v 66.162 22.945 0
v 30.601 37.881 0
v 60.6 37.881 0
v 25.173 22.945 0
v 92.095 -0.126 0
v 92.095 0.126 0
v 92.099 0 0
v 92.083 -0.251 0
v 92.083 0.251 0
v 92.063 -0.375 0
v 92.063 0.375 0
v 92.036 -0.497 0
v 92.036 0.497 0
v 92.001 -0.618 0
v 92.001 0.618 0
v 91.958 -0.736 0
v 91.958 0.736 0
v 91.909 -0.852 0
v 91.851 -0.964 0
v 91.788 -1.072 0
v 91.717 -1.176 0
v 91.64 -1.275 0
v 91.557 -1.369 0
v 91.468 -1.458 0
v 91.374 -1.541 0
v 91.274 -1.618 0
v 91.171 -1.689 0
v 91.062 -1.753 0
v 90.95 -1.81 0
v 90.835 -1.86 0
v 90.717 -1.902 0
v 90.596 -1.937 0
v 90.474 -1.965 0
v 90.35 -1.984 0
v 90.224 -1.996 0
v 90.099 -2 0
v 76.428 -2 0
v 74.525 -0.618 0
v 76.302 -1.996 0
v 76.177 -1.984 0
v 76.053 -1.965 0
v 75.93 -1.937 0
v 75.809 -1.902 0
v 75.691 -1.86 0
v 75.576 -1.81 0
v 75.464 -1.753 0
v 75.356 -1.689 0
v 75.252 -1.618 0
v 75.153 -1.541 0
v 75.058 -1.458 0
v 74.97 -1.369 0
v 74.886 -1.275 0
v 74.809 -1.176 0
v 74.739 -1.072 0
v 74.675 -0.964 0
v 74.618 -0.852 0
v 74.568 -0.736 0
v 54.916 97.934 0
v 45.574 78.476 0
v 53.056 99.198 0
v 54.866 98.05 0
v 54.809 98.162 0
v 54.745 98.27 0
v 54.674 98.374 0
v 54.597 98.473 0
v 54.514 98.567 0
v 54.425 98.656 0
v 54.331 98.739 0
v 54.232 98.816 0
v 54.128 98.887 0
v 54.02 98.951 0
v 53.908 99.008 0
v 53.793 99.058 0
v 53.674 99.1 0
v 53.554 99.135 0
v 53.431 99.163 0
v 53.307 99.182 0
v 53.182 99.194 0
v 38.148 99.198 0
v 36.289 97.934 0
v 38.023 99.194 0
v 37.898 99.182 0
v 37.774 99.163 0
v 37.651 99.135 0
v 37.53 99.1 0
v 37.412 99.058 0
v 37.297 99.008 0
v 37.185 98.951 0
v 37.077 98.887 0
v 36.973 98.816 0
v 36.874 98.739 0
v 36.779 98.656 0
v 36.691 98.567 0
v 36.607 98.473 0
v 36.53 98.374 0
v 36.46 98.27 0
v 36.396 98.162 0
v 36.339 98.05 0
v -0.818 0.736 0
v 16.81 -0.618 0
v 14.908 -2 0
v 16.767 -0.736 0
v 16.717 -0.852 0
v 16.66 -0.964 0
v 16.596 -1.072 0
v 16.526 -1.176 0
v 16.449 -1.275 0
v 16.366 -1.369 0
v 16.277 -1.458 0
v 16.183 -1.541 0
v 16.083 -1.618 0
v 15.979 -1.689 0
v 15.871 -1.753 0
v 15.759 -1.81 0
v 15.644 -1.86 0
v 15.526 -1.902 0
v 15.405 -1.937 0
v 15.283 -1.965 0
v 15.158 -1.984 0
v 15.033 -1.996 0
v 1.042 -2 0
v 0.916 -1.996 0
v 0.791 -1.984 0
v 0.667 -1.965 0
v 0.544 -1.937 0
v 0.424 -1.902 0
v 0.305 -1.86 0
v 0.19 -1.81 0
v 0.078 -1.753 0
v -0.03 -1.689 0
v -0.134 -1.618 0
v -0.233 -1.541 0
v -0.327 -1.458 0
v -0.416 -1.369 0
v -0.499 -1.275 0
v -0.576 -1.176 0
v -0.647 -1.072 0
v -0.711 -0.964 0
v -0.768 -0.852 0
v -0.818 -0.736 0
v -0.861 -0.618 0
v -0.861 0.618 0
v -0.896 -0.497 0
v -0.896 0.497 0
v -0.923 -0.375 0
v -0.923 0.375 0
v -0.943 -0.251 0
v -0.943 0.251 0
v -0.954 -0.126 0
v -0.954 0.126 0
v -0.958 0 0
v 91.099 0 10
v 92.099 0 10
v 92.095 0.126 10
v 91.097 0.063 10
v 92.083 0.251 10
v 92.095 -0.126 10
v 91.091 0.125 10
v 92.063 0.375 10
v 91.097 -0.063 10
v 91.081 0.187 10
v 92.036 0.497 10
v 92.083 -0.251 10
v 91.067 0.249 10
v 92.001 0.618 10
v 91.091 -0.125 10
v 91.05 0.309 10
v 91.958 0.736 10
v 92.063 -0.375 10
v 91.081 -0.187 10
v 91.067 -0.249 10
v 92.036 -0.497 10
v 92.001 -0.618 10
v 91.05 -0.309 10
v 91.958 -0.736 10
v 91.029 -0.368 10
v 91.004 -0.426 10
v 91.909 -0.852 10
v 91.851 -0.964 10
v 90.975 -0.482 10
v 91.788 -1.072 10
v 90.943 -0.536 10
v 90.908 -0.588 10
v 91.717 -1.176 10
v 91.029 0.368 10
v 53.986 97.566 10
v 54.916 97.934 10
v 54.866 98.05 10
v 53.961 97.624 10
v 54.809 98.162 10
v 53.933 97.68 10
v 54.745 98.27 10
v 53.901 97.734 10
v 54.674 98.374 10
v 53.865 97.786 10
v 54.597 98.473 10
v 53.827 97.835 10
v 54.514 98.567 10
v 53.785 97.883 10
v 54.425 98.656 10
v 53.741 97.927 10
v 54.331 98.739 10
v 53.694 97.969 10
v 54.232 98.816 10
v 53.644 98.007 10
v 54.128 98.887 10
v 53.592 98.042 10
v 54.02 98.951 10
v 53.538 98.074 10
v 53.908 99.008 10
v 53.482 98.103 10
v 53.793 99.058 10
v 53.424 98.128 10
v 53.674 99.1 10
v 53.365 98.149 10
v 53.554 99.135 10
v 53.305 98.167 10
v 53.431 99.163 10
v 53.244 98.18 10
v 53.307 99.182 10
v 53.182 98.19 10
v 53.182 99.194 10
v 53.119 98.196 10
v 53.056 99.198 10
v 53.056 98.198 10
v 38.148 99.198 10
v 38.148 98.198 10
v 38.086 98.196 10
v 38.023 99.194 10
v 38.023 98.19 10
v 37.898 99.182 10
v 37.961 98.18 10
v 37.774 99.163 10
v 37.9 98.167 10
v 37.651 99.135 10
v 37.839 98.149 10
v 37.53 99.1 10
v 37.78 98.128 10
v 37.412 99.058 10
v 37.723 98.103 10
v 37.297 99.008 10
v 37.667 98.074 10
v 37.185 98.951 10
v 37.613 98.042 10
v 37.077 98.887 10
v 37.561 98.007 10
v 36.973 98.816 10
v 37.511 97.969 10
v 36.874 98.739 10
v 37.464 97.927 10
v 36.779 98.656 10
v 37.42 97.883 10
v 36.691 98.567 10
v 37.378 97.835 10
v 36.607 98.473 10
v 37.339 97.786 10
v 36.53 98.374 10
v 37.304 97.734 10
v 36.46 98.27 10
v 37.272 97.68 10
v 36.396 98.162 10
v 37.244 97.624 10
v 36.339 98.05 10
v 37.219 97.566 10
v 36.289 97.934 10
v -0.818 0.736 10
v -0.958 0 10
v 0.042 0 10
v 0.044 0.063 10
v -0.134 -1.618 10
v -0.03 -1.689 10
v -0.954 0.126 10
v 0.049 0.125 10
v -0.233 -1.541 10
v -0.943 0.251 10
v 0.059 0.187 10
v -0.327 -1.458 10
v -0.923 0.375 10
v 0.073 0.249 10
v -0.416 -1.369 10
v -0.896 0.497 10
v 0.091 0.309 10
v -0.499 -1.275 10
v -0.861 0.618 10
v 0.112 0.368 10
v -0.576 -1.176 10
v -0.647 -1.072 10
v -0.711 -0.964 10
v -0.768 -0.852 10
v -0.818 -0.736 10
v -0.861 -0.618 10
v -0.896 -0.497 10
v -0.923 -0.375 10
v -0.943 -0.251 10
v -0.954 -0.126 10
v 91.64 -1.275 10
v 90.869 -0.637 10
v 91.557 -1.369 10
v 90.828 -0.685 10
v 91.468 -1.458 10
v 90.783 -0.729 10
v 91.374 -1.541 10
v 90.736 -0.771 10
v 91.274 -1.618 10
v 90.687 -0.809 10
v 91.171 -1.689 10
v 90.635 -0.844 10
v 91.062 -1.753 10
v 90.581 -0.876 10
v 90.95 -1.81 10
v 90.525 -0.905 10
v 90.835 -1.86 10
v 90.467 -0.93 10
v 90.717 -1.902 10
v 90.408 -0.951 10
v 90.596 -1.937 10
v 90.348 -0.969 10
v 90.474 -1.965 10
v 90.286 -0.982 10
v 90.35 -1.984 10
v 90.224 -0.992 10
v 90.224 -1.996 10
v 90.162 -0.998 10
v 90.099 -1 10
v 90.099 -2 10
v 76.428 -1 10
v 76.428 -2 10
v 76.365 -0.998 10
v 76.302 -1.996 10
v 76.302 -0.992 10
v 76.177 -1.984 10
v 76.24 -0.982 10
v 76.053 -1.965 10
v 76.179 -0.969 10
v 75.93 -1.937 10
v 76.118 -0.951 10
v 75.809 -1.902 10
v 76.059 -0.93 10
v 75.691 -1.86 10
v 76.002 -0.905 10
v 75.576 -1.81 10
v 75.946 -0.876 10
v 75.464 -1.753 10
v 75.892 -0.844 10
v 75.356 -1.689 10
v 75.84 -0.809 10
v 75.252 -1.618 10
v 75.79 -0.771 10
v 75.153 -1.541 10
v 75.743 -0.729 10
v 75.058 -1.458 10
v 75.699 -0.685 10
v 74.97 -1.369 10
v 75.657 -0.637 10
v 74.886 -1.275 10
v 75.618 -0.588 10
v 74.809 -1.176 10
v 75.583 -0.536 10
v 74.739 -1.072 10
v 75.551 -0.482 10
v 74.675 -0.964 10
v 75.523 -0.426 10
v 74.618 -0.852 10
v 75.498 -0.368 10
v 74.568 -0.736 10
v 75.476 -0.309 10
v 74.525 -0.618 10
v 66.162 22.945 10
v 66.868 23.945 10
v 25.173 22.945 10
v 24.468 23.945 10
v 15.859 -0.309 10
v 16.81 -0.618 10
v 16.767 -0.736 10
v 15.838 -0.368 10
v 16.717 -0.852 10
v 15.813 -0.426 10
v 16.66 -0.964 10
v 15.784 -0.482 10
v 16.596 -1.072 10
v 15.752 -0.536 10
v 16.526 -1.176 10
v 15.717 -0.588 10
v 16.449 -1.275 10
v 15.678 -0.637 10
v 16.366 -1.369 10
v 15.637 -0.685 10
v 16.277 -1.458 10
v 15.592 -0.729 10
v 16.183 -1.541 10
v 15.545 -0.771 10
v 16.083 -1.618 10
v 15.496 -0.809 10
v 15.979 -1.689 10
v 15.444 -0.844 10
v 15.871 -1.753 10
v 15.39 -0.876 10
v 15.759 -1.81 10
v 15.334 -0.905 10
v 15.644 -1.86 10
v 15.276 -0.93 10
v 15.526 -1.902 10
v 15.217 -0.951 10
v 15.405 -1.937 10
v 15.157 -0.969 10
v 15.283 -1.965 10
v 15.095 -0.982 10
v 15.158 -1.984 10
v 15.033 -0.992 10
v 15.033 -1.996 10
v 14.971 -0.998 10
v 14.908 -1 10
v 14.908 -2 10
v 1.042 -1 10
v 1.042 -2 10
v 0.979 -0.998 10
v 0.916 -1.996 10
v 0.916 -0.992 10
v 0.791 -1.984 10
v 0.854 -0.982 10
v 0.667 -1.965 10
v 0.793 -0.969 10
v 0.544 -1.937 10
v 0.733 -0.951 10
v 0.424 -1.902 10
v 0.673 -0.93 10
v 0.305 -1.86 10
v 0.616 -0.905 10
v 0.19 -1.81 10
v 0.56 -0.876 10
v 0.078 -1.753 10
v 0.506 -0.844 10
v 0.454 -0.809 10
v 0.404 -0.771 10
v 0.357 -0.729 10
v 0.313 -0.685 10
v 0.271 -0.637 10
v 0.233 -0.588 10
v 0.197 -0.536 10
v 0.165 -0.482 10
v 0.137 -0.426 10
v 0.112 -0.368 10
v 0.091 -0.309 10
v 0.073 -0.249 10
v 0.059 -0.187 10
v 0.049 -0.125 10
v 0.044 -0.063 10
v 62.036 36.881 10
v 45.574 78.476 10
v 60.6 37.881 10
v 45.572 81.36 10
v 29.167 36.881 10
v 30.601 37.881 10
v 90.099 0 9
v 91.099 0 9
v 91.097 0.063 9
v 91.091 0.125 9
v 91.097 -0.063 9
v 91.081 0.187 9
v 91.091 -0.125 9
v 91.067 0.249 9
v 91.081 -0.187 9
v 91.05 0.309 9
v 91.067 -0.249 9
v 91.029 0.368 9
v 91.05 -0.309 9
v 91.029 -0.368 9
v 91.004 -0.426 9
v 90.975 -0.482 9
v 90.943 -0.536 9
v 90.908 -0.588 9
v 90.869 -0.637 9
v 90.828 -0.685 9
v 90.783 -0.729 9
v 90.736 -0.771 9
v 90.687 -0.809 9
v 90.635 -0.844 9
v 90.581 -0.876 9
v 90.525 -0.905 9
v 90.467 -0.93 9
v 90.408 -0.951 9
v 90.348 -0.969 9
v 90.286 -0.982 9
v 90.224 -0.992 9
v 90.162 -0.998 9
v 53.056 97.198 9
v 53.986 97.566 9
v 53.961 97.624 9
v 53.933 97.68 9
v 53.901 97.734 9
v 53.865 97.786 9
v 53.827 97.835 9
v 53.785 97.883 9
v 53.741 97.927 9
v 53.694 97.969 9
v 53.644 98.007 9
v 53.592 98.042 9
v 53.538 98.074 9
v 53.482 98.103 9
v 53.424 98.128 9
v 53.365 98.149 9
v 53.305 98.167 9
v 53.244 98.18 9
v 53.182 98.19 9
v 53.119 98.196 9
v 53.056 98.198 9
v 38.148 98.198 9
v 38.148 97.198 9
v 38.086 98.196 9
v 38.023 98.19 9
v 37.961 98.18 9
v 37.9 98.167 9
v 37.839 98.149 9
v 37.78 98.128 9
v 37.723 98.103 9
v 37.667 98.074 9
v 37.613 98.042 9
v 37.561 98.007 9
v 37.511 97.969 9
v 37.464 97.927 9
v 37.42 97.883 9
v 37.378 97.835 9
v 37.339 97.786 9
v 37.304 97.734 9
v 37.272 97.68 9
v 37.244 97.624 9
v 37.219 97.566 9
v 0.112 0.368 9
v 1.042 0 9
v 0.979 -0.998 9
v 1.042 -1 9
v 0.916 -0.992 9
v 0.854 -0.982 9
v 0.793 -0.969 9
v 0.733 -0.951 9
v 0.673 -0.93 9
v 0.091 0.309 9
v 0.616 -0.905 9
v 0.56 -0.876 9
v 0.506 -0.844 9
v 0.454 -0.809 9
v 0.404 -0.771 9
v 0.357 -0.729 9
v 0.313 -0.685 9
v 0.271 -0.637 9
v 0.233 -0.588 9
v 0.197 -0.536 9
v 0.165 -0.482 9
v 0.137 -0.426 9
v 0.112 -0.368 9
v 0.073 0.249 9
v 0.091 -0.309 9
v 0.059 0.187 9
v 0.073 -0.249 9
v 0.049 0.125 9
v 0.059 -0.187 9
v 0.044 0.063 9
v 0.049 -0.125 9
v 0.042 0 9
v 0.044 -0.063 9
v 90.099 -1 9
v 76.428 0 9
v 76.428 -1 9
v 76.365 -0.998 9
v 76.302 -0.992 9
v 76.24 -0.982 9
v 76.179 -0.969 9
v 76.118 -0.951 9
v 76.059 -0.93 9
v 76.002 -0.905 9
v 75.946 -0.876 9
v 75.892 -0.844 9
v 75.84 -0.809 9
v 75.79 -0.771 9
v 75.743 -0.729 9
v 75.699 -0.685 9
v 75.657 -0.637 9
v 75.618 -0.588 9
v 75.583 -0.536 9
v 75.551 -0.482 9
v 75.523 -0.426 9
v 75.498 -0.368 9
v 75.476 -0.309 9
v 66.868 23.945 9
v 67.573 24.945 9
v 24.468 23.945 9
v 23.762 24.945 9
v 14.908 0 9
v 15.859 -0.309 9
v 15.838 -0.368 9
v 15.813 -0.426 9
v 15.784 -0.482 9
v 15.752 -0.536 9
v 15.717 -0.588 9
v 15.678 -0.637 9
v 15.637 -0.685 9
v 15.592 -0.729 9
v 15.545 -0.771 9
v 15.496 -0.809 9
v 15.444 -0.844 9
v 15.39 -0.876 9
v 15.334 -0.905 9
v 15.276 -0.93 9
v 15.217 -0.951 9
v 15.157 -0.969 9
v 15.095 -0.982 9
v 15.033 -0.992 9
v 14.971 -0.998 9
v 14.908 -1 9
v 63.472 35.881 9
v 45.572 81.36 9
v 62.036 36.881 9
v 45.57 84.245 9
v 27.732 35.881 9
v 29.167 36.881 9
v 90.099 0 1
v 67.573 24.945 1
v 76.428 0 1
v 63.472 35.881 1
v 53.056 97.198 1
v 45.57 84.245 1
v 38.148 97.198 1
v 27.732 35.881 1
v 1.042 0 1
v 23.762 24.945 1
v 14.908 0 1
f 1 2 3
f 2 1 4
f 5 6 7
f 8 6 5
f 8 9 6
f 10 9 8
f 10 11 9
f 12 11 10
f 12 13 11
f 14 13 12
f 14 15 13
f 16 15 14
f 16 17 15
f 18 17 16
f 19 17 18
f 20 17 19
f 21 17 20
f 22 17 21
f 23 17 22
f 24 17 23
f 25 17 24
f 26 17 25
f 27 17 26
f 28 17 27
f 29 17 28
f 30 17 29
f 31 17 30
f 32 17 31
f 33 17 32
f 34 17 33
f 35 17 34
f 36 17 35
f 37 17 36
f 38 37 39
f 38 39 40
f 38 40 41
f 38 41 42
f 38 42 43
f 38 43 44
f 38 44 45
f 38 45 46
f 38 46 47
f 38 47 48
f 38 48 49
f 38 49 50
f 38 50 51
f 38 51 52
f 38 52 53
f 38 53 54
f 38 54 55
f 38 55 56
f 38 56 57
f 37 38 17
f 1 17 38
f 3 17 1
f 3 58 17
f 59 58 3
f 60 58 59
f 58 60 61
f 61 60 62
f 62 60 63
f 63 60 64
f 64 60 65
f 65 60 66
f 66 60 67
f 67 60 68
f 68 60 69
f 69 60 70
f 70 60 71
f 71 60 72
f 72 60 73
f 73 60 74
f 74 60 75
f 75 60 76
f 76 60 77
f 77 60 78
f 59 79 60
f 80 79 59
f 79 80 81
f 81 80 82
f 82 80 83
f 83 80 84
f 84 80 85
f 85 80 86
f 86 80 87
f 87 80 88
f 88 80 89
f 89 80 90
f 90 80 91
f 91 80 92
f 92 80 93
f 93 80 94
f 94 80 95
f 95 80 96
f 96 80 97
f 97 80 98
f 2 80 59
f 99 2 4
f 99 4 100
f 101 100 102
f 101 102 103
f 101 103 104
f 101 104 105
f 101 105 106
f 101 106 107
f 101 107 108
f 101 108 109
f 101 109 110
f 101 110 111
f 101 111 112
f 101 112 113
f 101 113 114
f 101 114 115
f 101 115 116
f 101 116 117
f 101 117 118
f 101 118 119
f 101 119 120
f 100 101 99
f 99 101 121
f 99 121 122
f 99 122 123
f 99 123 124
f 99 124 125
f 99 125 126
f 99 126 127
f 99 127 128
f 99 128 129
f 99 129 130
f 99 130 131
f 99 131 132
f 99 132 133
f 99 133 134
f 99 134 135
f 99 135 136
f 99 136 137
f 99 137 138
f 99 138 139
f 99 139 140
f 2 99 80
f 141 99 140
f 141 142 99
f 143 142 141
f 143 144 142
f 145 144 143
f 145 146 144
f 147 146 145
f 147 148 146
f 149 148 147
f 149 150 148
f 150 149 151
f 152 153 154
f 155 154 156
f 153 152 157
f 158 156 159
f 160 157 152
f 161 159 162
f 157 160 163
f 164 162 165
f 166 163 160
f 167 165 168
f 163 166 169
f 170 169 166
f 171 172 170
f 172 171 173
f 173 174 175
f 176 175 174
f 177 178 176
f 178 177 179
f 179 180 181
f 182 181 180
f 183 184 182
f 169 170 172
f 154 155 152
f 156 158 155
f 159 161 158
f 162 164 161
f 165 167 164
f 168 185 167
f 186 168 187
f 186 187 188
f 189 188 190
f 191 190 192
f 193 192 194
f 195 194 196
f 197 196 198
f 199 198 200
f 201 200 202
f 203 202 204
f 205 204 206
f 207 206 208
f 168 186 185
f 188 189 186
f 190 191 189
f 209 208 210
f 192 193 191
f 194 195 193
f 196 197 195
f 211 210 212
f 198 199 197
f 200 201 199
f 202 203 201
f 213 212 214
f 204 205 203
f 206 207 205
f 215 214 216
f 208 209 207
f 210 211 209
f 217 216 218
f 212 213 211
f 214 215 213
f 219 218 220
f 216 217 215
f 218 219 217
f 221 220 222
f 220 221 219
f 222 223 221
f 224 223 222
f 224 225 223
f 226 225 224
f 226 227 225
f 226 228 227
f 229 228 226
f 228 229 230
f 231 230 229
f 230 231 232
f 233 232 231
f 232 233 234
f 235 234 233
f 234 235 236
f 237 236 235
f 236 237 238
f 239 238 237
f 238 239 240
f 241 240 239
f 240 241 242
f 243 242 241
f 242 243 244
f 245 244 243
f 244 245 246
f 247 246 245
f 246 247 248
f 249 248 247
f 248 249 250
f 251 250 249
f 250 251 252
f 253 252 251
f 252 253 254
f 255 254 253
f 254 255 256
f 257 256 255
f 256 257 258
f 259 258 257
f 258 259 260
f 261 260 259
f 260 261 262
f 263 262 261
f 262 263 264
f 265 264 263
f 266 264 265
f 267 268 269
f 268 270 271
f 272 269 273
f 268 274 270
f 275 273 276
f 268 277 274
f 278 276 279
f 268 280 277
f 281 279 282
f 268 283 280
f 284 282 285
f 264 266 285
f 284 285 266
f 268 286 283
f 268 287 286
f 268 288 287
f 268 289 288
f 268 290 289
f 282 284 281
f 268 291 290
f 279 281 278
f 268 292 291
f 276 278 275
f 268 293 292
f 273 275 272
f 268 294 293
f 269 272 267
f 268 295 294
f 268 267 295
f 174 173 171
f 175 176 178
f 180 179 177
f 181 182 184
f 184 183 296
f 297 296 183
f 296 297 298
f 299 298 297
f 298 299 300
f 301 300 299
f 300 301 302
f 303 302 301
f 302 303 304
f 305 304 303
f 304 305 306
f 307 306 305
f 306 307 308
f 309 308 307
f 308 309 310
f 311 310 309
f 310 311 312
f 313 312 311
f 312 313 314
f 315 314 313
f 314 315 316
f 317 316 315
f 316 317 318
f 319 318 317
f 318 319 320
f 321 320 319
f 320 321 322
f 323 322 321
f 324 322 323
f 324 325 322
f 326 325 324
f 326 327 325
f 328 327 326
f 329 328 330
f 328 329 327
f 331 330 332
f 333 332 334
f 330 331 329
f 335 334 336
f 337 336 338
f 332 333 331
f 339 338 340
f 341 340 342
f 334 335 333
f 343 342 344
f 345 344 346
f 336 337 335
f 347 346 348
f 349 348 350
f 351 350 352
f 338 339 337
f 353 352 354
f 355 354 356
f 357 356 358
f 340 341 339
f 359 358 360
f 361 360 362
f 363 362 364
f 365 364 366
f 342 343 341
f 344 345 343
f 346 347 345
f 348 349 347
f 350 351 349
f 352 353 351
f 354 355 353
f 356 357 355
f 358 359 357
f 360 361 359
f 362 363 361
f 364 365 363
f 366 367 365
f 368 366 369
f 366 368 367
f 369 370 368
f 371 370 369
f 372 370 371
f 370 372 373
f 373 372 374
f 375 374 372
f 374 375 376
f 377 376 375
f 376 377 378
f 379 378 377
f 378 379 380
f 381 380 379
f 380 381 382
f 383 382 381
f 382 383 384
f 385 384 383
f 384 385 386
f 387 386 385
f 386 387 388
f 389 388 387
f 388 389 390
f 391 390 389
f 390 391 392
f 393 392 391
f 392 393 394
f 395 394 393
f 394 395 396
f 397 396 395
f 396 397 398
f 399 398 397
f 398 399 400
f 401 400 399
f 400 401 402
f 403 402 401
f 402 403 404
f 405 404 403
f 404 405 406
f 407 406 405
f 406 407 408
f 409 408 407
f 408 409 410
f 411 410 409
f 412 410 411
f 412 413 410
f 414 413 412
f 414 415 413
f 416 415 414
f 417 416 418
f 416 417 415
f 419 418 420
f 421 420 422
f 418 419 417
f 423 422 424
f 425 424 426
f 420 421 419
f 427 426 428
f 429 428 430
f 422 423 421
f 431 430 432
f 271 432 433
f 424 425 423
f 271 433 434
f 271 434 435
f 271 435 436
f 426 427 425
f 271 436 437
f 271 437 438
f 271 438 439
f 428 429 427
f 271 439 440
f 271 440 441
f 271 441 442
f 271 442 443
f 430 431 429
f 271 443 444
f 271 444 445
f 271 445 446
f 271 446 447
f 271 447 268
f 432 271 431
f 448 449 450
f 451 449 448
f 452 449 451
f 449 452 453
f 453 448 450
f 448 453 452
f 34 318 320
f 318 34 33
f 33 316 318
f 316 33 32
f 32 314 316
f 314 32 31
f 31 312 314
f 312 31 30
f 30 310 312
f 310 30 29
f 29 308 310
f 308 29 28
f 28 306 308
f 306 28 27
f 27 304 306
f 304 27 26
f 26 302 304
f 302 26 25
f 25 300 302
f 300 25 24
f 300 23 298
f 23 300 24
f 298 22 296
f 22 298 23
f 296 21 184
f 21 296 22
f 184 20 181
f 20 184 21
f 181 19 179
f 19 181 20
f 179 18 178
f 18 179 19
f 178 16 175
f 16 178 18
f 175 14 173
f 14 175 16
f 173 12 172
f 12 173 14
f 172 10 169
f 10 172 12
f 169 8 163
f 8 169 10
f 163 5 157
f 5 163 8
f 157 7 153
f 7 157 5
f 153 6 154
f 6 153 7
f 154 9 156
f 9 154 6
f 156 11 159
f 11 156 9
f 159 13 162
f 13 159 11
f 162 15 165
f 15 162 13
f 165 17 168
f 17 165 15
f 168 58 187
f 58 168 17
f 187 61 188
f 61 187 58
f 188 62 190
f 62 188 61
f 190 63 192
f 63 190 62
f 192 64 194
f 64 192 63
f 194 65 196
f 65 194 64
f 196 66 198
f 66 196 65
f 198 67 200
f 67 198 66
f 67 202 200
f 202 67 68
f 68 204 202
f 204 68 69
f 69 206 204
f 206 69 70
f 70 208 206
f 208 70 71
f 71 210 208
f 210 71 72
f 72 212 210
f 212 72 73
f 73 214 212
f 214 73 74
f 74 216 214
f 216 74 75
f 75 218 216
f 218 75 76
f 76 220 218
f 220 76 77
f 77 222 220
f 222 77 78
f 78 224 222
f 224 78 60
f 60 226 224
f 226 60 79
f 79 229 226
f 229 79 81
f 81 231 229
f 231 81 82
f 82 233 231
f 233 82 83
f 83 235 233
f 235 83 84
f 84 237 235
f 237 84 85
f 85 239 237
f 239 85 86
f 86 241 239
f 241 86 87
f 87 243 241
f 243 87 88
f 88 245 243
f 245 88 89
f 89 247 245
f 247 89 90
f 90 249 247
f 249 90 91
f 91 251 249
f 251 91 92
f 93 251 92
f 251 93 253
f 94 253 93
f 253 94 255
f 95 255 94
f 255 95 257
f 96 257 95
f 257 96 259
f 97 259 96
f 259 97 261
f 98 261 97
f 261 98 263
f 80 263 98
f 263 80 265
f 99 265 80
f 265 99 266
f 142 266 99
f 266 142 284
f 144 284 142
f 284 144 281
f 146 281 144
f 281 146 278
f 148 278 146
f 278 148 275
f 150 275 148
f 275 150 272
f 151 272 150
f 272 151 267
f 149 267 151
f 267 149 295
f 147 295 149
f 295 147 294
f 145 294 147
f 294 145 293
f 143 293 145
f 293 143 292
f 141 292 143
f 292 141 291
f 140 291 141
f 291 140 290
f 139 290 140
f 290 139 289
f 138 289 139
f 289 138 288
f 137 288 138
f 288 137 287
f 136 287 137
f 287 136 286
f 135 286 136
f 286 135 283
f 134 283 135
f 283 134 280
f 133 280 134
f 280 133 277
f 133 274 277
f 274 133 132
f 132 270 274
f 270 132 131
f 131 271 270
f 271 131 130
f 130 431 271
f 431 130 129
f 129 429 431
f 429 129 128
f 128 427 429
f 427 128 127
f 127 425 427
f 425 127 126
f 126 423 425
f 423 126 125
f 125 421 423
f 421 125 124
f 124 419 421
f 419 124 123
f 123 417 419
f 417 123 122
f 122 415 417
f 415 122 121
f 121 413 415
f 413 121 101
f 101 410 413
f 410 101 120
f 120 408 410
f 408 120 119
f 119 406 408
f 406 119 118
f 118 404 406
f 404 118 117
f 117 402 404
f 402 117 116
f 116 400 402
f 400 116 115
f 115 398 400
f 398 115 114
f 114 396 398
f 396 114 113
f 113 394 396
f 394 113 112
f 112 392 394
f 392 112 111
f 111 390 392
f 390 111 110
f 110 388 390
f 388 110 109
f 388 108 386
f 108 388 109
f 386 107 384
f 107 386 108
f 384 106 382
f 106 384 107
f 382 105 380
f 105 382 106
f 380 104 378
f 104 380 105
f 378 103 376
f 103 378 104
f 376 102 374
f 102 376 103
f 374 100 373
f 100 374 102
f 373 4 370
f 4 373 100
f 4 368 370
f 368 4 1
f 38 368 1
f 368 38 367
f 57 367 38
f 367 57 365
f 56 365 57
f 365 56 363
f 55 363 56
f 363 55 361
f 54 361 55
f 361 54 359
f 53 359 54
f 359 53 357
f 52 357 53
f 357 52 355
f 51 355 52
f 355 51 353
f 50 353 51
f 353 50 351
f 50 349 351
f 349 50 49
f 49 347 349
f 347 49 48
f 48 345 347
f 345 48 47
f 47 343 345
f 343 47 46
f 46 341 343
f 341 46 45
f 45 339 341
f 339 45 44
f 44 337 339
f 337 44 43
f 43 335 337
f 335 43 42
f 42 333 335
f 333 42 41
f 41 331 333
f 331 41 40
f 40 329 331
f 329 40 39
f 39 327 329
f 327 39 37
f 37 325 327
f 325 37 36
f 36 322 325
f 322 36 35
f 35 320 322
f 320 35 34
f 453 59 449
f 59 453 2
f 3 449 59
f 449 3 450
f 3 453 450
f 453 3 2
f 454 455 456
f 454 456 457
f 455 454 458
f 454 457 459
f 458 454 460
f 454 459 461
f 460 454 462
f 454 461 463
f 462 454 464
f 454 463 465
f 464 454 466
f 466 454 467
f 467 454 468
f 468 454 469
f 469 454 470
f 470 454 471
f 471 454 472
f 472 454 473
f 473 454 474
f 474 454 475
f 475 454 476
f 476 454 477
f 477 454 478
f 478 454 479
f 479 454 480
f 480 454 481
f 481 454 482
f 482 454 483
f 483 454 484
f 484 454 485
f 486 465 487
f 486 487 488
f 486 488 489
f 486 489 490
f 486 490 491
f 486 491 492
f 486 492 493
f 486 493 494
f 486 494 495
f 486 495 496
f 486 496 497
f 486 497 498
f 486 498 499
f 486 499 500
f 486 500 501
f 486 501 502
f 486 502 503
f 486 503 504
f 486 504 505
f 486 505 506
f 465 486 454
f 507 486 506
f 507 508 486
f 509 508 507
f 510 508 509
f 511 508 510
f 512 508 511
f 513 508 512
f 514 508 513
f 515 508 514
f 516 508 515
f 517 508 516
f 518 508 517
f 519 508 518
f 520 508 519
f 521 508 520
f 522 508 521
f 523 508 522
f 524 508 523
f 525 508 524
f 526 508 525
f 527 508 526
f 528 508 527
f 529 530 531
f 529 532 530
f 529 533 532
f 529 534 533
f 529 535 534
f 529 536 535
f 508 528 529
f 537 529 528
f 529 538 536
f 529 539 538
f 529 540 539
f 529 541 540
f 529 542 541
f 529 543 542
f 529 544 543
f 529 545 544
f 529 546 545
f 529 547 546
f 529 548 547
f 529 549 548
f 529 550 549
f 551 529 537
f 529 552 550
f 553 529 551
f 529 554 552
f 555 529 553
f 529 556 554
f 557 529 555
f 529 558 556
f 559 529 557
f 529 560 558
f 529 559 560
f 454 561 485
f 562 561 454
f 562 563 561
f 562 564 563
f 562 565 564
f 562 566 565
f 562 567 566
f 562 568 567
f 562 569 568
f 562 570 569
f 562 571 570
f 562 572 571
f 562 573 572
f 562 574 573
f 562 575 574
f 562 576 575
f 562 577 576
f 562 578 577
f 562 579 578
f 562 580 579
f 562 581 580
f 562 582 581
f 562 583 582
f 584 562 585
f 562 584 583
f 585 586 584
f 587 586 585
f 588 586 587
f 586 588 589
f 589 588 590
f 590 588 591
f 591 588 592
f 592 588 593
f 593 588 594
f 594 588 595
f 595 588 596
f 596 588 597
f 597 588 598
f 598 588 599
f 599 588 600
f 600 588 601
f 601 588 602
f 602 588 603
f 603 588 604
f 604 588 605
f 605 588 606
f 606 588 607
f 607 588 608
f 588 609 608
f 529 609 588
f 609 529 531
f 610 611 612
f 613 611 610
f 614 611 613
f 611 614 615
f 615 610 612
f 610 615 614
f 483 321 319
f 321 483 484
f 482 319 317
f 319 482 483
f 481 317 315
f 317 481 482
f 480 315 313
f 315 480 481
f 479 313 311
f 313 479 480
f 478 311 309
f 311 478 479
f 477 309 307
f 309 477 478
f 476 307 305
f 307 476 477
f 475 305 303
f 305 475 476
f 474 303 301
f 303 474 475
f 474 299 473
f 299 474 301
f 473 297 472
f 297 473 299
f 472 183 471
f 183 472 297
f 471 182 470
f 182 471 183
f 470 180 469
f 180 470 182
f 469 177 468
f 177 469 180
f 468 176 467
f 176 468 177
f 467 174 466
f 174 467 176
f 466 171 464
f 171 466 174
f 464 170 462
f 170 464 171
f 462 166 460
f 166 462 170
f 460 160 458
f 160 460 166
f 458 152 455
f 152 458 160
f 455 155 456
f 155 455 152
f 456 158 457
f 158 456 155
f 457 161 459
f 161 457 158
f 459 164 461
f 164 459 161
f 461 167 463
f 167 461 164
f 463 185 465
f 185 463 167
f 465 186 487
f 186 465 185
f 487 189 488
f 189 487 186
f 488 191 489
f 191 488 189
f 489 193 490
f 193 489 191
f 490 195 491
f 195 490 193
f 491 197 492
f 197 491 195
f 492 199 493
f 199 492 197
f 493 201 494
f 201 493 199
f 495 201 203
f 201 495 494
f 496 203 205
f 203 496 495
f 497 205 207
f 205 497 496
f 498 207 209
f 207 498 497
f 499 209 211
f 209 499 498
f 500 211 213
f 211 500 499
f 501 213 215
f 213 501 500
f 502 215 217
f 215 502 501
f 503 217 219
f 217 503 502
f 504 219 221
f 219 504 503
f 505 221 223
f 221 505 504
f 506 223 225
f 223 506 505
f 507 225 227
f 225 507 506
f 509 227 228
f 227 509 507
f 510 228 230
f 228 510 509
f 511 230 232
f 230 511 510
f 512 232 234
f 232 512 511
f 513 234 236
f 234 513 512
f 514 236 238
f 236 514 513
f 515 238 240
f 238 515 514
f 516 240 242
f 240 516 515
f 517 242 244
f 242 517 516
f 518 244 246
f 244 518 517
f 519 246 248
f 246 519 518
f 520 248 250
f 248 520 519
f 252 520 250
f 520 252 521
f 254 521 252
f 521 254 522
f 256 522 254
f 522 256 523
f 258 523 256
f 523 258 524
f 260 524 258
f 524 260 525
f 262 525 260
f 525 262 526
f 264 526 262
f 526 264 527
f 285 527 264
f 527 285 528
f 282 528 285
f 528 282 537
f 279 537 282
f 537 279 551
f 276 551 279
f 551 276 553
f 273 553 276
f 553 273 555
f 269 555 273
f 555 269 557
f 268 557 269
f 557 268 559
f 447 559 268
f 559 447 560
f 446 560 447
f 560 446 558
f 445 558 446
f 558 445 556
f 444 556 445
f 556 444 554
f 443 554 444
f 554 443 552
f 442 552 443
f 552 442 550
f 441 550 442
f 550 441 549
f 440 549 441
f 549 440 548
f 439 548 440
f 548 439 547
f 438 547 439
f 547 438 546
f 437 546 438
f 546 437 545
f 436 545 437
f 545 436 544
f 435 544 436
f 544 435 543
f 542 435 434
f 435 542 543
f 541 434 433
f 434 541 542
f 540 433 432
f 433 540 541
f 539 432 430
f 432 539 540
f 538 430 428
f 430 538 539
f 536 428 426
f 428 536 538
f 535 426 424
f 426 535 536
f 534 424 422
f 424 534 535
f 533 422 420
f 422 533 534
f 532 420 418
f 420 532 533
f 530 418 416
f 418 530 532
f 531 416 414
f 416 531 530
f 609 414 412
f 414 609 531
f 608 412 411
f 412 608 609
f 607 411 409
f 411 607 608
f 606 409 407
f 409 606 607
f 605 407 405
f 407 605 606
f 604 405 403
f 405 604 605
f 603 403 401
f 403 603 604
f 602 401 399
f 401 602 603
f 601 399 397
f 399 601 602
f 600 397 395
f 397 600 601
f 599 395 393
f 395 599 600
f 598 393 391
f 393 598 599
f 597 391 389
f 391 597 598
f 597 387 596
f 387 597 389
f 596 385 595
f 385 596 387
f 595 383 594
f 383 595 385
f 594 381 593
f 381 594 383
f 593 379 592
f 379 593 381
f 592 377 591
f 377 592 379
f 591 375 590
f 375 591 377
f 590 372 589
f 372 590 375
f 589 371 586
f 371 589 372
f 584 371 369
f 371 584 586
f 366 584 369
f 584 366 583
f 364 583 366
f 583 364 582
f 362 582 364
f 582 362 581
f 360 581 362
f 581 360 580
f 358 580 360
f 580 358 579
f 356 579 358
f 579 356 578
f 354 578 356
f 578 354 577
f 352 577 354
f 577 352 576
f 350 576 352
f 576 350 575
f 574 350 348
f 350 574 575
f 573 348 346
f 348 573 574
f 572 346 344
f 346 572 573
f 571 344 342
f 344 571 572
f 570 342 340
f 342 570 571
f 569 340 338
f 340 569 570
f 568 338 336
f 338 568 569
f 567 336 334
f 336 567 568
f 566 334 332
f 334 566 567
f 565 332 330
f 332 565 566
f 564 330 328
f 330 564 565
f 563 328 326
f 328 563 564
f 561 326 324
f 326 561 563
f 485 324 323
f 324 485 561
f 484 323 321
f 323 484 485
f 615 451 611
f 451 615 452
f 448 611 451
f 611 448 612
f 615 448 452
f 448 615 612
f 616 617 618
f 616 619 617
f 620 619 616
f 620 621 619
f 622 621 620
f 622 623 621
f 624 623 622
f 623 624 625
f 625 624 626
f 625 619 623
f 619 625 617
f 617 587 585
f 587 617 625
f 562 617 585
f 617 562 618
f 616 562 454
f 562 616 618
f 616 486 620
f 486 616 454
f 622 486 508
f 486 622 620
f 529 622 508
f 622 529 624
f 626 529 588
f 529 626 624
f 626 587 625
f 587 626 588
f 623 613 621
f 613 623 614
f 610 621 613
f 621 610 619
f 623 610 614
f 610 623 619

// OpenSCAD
//Sign body maker V3 - bigclivedotcom
letter = "A"; //Sign character to make
style = "Noto Mono"; //See "Help" and "Font List"
size = 100; //Size of character (height)
depth = 10; //Depth of sign character
$fn=100; //Curve facets - higher is smoother
walls = 2; //Side wall thickness
base=1; //Base thickness (-1 for open back)
face = 1; //Face thickness
//Don't change variables below here
sized=size-(2*walls);
difference(){
     linear_extrude(height=depth)
	  minkowski(){
	  text(letter,sized,style);
	  circle(walls);
     }
//Lip for front face (half wall thickness)
     translate([0,0,depth-face])
	  linear_extrude(height=2*face)
	  minkowski(){
	  text(letter,sized,style);
	  circle(walls/2);
     }
//hollow core of letter
     translate([0,0,base])
	  linear_extrude(height=depth+2)
	  text(letter,sized,style);
}
